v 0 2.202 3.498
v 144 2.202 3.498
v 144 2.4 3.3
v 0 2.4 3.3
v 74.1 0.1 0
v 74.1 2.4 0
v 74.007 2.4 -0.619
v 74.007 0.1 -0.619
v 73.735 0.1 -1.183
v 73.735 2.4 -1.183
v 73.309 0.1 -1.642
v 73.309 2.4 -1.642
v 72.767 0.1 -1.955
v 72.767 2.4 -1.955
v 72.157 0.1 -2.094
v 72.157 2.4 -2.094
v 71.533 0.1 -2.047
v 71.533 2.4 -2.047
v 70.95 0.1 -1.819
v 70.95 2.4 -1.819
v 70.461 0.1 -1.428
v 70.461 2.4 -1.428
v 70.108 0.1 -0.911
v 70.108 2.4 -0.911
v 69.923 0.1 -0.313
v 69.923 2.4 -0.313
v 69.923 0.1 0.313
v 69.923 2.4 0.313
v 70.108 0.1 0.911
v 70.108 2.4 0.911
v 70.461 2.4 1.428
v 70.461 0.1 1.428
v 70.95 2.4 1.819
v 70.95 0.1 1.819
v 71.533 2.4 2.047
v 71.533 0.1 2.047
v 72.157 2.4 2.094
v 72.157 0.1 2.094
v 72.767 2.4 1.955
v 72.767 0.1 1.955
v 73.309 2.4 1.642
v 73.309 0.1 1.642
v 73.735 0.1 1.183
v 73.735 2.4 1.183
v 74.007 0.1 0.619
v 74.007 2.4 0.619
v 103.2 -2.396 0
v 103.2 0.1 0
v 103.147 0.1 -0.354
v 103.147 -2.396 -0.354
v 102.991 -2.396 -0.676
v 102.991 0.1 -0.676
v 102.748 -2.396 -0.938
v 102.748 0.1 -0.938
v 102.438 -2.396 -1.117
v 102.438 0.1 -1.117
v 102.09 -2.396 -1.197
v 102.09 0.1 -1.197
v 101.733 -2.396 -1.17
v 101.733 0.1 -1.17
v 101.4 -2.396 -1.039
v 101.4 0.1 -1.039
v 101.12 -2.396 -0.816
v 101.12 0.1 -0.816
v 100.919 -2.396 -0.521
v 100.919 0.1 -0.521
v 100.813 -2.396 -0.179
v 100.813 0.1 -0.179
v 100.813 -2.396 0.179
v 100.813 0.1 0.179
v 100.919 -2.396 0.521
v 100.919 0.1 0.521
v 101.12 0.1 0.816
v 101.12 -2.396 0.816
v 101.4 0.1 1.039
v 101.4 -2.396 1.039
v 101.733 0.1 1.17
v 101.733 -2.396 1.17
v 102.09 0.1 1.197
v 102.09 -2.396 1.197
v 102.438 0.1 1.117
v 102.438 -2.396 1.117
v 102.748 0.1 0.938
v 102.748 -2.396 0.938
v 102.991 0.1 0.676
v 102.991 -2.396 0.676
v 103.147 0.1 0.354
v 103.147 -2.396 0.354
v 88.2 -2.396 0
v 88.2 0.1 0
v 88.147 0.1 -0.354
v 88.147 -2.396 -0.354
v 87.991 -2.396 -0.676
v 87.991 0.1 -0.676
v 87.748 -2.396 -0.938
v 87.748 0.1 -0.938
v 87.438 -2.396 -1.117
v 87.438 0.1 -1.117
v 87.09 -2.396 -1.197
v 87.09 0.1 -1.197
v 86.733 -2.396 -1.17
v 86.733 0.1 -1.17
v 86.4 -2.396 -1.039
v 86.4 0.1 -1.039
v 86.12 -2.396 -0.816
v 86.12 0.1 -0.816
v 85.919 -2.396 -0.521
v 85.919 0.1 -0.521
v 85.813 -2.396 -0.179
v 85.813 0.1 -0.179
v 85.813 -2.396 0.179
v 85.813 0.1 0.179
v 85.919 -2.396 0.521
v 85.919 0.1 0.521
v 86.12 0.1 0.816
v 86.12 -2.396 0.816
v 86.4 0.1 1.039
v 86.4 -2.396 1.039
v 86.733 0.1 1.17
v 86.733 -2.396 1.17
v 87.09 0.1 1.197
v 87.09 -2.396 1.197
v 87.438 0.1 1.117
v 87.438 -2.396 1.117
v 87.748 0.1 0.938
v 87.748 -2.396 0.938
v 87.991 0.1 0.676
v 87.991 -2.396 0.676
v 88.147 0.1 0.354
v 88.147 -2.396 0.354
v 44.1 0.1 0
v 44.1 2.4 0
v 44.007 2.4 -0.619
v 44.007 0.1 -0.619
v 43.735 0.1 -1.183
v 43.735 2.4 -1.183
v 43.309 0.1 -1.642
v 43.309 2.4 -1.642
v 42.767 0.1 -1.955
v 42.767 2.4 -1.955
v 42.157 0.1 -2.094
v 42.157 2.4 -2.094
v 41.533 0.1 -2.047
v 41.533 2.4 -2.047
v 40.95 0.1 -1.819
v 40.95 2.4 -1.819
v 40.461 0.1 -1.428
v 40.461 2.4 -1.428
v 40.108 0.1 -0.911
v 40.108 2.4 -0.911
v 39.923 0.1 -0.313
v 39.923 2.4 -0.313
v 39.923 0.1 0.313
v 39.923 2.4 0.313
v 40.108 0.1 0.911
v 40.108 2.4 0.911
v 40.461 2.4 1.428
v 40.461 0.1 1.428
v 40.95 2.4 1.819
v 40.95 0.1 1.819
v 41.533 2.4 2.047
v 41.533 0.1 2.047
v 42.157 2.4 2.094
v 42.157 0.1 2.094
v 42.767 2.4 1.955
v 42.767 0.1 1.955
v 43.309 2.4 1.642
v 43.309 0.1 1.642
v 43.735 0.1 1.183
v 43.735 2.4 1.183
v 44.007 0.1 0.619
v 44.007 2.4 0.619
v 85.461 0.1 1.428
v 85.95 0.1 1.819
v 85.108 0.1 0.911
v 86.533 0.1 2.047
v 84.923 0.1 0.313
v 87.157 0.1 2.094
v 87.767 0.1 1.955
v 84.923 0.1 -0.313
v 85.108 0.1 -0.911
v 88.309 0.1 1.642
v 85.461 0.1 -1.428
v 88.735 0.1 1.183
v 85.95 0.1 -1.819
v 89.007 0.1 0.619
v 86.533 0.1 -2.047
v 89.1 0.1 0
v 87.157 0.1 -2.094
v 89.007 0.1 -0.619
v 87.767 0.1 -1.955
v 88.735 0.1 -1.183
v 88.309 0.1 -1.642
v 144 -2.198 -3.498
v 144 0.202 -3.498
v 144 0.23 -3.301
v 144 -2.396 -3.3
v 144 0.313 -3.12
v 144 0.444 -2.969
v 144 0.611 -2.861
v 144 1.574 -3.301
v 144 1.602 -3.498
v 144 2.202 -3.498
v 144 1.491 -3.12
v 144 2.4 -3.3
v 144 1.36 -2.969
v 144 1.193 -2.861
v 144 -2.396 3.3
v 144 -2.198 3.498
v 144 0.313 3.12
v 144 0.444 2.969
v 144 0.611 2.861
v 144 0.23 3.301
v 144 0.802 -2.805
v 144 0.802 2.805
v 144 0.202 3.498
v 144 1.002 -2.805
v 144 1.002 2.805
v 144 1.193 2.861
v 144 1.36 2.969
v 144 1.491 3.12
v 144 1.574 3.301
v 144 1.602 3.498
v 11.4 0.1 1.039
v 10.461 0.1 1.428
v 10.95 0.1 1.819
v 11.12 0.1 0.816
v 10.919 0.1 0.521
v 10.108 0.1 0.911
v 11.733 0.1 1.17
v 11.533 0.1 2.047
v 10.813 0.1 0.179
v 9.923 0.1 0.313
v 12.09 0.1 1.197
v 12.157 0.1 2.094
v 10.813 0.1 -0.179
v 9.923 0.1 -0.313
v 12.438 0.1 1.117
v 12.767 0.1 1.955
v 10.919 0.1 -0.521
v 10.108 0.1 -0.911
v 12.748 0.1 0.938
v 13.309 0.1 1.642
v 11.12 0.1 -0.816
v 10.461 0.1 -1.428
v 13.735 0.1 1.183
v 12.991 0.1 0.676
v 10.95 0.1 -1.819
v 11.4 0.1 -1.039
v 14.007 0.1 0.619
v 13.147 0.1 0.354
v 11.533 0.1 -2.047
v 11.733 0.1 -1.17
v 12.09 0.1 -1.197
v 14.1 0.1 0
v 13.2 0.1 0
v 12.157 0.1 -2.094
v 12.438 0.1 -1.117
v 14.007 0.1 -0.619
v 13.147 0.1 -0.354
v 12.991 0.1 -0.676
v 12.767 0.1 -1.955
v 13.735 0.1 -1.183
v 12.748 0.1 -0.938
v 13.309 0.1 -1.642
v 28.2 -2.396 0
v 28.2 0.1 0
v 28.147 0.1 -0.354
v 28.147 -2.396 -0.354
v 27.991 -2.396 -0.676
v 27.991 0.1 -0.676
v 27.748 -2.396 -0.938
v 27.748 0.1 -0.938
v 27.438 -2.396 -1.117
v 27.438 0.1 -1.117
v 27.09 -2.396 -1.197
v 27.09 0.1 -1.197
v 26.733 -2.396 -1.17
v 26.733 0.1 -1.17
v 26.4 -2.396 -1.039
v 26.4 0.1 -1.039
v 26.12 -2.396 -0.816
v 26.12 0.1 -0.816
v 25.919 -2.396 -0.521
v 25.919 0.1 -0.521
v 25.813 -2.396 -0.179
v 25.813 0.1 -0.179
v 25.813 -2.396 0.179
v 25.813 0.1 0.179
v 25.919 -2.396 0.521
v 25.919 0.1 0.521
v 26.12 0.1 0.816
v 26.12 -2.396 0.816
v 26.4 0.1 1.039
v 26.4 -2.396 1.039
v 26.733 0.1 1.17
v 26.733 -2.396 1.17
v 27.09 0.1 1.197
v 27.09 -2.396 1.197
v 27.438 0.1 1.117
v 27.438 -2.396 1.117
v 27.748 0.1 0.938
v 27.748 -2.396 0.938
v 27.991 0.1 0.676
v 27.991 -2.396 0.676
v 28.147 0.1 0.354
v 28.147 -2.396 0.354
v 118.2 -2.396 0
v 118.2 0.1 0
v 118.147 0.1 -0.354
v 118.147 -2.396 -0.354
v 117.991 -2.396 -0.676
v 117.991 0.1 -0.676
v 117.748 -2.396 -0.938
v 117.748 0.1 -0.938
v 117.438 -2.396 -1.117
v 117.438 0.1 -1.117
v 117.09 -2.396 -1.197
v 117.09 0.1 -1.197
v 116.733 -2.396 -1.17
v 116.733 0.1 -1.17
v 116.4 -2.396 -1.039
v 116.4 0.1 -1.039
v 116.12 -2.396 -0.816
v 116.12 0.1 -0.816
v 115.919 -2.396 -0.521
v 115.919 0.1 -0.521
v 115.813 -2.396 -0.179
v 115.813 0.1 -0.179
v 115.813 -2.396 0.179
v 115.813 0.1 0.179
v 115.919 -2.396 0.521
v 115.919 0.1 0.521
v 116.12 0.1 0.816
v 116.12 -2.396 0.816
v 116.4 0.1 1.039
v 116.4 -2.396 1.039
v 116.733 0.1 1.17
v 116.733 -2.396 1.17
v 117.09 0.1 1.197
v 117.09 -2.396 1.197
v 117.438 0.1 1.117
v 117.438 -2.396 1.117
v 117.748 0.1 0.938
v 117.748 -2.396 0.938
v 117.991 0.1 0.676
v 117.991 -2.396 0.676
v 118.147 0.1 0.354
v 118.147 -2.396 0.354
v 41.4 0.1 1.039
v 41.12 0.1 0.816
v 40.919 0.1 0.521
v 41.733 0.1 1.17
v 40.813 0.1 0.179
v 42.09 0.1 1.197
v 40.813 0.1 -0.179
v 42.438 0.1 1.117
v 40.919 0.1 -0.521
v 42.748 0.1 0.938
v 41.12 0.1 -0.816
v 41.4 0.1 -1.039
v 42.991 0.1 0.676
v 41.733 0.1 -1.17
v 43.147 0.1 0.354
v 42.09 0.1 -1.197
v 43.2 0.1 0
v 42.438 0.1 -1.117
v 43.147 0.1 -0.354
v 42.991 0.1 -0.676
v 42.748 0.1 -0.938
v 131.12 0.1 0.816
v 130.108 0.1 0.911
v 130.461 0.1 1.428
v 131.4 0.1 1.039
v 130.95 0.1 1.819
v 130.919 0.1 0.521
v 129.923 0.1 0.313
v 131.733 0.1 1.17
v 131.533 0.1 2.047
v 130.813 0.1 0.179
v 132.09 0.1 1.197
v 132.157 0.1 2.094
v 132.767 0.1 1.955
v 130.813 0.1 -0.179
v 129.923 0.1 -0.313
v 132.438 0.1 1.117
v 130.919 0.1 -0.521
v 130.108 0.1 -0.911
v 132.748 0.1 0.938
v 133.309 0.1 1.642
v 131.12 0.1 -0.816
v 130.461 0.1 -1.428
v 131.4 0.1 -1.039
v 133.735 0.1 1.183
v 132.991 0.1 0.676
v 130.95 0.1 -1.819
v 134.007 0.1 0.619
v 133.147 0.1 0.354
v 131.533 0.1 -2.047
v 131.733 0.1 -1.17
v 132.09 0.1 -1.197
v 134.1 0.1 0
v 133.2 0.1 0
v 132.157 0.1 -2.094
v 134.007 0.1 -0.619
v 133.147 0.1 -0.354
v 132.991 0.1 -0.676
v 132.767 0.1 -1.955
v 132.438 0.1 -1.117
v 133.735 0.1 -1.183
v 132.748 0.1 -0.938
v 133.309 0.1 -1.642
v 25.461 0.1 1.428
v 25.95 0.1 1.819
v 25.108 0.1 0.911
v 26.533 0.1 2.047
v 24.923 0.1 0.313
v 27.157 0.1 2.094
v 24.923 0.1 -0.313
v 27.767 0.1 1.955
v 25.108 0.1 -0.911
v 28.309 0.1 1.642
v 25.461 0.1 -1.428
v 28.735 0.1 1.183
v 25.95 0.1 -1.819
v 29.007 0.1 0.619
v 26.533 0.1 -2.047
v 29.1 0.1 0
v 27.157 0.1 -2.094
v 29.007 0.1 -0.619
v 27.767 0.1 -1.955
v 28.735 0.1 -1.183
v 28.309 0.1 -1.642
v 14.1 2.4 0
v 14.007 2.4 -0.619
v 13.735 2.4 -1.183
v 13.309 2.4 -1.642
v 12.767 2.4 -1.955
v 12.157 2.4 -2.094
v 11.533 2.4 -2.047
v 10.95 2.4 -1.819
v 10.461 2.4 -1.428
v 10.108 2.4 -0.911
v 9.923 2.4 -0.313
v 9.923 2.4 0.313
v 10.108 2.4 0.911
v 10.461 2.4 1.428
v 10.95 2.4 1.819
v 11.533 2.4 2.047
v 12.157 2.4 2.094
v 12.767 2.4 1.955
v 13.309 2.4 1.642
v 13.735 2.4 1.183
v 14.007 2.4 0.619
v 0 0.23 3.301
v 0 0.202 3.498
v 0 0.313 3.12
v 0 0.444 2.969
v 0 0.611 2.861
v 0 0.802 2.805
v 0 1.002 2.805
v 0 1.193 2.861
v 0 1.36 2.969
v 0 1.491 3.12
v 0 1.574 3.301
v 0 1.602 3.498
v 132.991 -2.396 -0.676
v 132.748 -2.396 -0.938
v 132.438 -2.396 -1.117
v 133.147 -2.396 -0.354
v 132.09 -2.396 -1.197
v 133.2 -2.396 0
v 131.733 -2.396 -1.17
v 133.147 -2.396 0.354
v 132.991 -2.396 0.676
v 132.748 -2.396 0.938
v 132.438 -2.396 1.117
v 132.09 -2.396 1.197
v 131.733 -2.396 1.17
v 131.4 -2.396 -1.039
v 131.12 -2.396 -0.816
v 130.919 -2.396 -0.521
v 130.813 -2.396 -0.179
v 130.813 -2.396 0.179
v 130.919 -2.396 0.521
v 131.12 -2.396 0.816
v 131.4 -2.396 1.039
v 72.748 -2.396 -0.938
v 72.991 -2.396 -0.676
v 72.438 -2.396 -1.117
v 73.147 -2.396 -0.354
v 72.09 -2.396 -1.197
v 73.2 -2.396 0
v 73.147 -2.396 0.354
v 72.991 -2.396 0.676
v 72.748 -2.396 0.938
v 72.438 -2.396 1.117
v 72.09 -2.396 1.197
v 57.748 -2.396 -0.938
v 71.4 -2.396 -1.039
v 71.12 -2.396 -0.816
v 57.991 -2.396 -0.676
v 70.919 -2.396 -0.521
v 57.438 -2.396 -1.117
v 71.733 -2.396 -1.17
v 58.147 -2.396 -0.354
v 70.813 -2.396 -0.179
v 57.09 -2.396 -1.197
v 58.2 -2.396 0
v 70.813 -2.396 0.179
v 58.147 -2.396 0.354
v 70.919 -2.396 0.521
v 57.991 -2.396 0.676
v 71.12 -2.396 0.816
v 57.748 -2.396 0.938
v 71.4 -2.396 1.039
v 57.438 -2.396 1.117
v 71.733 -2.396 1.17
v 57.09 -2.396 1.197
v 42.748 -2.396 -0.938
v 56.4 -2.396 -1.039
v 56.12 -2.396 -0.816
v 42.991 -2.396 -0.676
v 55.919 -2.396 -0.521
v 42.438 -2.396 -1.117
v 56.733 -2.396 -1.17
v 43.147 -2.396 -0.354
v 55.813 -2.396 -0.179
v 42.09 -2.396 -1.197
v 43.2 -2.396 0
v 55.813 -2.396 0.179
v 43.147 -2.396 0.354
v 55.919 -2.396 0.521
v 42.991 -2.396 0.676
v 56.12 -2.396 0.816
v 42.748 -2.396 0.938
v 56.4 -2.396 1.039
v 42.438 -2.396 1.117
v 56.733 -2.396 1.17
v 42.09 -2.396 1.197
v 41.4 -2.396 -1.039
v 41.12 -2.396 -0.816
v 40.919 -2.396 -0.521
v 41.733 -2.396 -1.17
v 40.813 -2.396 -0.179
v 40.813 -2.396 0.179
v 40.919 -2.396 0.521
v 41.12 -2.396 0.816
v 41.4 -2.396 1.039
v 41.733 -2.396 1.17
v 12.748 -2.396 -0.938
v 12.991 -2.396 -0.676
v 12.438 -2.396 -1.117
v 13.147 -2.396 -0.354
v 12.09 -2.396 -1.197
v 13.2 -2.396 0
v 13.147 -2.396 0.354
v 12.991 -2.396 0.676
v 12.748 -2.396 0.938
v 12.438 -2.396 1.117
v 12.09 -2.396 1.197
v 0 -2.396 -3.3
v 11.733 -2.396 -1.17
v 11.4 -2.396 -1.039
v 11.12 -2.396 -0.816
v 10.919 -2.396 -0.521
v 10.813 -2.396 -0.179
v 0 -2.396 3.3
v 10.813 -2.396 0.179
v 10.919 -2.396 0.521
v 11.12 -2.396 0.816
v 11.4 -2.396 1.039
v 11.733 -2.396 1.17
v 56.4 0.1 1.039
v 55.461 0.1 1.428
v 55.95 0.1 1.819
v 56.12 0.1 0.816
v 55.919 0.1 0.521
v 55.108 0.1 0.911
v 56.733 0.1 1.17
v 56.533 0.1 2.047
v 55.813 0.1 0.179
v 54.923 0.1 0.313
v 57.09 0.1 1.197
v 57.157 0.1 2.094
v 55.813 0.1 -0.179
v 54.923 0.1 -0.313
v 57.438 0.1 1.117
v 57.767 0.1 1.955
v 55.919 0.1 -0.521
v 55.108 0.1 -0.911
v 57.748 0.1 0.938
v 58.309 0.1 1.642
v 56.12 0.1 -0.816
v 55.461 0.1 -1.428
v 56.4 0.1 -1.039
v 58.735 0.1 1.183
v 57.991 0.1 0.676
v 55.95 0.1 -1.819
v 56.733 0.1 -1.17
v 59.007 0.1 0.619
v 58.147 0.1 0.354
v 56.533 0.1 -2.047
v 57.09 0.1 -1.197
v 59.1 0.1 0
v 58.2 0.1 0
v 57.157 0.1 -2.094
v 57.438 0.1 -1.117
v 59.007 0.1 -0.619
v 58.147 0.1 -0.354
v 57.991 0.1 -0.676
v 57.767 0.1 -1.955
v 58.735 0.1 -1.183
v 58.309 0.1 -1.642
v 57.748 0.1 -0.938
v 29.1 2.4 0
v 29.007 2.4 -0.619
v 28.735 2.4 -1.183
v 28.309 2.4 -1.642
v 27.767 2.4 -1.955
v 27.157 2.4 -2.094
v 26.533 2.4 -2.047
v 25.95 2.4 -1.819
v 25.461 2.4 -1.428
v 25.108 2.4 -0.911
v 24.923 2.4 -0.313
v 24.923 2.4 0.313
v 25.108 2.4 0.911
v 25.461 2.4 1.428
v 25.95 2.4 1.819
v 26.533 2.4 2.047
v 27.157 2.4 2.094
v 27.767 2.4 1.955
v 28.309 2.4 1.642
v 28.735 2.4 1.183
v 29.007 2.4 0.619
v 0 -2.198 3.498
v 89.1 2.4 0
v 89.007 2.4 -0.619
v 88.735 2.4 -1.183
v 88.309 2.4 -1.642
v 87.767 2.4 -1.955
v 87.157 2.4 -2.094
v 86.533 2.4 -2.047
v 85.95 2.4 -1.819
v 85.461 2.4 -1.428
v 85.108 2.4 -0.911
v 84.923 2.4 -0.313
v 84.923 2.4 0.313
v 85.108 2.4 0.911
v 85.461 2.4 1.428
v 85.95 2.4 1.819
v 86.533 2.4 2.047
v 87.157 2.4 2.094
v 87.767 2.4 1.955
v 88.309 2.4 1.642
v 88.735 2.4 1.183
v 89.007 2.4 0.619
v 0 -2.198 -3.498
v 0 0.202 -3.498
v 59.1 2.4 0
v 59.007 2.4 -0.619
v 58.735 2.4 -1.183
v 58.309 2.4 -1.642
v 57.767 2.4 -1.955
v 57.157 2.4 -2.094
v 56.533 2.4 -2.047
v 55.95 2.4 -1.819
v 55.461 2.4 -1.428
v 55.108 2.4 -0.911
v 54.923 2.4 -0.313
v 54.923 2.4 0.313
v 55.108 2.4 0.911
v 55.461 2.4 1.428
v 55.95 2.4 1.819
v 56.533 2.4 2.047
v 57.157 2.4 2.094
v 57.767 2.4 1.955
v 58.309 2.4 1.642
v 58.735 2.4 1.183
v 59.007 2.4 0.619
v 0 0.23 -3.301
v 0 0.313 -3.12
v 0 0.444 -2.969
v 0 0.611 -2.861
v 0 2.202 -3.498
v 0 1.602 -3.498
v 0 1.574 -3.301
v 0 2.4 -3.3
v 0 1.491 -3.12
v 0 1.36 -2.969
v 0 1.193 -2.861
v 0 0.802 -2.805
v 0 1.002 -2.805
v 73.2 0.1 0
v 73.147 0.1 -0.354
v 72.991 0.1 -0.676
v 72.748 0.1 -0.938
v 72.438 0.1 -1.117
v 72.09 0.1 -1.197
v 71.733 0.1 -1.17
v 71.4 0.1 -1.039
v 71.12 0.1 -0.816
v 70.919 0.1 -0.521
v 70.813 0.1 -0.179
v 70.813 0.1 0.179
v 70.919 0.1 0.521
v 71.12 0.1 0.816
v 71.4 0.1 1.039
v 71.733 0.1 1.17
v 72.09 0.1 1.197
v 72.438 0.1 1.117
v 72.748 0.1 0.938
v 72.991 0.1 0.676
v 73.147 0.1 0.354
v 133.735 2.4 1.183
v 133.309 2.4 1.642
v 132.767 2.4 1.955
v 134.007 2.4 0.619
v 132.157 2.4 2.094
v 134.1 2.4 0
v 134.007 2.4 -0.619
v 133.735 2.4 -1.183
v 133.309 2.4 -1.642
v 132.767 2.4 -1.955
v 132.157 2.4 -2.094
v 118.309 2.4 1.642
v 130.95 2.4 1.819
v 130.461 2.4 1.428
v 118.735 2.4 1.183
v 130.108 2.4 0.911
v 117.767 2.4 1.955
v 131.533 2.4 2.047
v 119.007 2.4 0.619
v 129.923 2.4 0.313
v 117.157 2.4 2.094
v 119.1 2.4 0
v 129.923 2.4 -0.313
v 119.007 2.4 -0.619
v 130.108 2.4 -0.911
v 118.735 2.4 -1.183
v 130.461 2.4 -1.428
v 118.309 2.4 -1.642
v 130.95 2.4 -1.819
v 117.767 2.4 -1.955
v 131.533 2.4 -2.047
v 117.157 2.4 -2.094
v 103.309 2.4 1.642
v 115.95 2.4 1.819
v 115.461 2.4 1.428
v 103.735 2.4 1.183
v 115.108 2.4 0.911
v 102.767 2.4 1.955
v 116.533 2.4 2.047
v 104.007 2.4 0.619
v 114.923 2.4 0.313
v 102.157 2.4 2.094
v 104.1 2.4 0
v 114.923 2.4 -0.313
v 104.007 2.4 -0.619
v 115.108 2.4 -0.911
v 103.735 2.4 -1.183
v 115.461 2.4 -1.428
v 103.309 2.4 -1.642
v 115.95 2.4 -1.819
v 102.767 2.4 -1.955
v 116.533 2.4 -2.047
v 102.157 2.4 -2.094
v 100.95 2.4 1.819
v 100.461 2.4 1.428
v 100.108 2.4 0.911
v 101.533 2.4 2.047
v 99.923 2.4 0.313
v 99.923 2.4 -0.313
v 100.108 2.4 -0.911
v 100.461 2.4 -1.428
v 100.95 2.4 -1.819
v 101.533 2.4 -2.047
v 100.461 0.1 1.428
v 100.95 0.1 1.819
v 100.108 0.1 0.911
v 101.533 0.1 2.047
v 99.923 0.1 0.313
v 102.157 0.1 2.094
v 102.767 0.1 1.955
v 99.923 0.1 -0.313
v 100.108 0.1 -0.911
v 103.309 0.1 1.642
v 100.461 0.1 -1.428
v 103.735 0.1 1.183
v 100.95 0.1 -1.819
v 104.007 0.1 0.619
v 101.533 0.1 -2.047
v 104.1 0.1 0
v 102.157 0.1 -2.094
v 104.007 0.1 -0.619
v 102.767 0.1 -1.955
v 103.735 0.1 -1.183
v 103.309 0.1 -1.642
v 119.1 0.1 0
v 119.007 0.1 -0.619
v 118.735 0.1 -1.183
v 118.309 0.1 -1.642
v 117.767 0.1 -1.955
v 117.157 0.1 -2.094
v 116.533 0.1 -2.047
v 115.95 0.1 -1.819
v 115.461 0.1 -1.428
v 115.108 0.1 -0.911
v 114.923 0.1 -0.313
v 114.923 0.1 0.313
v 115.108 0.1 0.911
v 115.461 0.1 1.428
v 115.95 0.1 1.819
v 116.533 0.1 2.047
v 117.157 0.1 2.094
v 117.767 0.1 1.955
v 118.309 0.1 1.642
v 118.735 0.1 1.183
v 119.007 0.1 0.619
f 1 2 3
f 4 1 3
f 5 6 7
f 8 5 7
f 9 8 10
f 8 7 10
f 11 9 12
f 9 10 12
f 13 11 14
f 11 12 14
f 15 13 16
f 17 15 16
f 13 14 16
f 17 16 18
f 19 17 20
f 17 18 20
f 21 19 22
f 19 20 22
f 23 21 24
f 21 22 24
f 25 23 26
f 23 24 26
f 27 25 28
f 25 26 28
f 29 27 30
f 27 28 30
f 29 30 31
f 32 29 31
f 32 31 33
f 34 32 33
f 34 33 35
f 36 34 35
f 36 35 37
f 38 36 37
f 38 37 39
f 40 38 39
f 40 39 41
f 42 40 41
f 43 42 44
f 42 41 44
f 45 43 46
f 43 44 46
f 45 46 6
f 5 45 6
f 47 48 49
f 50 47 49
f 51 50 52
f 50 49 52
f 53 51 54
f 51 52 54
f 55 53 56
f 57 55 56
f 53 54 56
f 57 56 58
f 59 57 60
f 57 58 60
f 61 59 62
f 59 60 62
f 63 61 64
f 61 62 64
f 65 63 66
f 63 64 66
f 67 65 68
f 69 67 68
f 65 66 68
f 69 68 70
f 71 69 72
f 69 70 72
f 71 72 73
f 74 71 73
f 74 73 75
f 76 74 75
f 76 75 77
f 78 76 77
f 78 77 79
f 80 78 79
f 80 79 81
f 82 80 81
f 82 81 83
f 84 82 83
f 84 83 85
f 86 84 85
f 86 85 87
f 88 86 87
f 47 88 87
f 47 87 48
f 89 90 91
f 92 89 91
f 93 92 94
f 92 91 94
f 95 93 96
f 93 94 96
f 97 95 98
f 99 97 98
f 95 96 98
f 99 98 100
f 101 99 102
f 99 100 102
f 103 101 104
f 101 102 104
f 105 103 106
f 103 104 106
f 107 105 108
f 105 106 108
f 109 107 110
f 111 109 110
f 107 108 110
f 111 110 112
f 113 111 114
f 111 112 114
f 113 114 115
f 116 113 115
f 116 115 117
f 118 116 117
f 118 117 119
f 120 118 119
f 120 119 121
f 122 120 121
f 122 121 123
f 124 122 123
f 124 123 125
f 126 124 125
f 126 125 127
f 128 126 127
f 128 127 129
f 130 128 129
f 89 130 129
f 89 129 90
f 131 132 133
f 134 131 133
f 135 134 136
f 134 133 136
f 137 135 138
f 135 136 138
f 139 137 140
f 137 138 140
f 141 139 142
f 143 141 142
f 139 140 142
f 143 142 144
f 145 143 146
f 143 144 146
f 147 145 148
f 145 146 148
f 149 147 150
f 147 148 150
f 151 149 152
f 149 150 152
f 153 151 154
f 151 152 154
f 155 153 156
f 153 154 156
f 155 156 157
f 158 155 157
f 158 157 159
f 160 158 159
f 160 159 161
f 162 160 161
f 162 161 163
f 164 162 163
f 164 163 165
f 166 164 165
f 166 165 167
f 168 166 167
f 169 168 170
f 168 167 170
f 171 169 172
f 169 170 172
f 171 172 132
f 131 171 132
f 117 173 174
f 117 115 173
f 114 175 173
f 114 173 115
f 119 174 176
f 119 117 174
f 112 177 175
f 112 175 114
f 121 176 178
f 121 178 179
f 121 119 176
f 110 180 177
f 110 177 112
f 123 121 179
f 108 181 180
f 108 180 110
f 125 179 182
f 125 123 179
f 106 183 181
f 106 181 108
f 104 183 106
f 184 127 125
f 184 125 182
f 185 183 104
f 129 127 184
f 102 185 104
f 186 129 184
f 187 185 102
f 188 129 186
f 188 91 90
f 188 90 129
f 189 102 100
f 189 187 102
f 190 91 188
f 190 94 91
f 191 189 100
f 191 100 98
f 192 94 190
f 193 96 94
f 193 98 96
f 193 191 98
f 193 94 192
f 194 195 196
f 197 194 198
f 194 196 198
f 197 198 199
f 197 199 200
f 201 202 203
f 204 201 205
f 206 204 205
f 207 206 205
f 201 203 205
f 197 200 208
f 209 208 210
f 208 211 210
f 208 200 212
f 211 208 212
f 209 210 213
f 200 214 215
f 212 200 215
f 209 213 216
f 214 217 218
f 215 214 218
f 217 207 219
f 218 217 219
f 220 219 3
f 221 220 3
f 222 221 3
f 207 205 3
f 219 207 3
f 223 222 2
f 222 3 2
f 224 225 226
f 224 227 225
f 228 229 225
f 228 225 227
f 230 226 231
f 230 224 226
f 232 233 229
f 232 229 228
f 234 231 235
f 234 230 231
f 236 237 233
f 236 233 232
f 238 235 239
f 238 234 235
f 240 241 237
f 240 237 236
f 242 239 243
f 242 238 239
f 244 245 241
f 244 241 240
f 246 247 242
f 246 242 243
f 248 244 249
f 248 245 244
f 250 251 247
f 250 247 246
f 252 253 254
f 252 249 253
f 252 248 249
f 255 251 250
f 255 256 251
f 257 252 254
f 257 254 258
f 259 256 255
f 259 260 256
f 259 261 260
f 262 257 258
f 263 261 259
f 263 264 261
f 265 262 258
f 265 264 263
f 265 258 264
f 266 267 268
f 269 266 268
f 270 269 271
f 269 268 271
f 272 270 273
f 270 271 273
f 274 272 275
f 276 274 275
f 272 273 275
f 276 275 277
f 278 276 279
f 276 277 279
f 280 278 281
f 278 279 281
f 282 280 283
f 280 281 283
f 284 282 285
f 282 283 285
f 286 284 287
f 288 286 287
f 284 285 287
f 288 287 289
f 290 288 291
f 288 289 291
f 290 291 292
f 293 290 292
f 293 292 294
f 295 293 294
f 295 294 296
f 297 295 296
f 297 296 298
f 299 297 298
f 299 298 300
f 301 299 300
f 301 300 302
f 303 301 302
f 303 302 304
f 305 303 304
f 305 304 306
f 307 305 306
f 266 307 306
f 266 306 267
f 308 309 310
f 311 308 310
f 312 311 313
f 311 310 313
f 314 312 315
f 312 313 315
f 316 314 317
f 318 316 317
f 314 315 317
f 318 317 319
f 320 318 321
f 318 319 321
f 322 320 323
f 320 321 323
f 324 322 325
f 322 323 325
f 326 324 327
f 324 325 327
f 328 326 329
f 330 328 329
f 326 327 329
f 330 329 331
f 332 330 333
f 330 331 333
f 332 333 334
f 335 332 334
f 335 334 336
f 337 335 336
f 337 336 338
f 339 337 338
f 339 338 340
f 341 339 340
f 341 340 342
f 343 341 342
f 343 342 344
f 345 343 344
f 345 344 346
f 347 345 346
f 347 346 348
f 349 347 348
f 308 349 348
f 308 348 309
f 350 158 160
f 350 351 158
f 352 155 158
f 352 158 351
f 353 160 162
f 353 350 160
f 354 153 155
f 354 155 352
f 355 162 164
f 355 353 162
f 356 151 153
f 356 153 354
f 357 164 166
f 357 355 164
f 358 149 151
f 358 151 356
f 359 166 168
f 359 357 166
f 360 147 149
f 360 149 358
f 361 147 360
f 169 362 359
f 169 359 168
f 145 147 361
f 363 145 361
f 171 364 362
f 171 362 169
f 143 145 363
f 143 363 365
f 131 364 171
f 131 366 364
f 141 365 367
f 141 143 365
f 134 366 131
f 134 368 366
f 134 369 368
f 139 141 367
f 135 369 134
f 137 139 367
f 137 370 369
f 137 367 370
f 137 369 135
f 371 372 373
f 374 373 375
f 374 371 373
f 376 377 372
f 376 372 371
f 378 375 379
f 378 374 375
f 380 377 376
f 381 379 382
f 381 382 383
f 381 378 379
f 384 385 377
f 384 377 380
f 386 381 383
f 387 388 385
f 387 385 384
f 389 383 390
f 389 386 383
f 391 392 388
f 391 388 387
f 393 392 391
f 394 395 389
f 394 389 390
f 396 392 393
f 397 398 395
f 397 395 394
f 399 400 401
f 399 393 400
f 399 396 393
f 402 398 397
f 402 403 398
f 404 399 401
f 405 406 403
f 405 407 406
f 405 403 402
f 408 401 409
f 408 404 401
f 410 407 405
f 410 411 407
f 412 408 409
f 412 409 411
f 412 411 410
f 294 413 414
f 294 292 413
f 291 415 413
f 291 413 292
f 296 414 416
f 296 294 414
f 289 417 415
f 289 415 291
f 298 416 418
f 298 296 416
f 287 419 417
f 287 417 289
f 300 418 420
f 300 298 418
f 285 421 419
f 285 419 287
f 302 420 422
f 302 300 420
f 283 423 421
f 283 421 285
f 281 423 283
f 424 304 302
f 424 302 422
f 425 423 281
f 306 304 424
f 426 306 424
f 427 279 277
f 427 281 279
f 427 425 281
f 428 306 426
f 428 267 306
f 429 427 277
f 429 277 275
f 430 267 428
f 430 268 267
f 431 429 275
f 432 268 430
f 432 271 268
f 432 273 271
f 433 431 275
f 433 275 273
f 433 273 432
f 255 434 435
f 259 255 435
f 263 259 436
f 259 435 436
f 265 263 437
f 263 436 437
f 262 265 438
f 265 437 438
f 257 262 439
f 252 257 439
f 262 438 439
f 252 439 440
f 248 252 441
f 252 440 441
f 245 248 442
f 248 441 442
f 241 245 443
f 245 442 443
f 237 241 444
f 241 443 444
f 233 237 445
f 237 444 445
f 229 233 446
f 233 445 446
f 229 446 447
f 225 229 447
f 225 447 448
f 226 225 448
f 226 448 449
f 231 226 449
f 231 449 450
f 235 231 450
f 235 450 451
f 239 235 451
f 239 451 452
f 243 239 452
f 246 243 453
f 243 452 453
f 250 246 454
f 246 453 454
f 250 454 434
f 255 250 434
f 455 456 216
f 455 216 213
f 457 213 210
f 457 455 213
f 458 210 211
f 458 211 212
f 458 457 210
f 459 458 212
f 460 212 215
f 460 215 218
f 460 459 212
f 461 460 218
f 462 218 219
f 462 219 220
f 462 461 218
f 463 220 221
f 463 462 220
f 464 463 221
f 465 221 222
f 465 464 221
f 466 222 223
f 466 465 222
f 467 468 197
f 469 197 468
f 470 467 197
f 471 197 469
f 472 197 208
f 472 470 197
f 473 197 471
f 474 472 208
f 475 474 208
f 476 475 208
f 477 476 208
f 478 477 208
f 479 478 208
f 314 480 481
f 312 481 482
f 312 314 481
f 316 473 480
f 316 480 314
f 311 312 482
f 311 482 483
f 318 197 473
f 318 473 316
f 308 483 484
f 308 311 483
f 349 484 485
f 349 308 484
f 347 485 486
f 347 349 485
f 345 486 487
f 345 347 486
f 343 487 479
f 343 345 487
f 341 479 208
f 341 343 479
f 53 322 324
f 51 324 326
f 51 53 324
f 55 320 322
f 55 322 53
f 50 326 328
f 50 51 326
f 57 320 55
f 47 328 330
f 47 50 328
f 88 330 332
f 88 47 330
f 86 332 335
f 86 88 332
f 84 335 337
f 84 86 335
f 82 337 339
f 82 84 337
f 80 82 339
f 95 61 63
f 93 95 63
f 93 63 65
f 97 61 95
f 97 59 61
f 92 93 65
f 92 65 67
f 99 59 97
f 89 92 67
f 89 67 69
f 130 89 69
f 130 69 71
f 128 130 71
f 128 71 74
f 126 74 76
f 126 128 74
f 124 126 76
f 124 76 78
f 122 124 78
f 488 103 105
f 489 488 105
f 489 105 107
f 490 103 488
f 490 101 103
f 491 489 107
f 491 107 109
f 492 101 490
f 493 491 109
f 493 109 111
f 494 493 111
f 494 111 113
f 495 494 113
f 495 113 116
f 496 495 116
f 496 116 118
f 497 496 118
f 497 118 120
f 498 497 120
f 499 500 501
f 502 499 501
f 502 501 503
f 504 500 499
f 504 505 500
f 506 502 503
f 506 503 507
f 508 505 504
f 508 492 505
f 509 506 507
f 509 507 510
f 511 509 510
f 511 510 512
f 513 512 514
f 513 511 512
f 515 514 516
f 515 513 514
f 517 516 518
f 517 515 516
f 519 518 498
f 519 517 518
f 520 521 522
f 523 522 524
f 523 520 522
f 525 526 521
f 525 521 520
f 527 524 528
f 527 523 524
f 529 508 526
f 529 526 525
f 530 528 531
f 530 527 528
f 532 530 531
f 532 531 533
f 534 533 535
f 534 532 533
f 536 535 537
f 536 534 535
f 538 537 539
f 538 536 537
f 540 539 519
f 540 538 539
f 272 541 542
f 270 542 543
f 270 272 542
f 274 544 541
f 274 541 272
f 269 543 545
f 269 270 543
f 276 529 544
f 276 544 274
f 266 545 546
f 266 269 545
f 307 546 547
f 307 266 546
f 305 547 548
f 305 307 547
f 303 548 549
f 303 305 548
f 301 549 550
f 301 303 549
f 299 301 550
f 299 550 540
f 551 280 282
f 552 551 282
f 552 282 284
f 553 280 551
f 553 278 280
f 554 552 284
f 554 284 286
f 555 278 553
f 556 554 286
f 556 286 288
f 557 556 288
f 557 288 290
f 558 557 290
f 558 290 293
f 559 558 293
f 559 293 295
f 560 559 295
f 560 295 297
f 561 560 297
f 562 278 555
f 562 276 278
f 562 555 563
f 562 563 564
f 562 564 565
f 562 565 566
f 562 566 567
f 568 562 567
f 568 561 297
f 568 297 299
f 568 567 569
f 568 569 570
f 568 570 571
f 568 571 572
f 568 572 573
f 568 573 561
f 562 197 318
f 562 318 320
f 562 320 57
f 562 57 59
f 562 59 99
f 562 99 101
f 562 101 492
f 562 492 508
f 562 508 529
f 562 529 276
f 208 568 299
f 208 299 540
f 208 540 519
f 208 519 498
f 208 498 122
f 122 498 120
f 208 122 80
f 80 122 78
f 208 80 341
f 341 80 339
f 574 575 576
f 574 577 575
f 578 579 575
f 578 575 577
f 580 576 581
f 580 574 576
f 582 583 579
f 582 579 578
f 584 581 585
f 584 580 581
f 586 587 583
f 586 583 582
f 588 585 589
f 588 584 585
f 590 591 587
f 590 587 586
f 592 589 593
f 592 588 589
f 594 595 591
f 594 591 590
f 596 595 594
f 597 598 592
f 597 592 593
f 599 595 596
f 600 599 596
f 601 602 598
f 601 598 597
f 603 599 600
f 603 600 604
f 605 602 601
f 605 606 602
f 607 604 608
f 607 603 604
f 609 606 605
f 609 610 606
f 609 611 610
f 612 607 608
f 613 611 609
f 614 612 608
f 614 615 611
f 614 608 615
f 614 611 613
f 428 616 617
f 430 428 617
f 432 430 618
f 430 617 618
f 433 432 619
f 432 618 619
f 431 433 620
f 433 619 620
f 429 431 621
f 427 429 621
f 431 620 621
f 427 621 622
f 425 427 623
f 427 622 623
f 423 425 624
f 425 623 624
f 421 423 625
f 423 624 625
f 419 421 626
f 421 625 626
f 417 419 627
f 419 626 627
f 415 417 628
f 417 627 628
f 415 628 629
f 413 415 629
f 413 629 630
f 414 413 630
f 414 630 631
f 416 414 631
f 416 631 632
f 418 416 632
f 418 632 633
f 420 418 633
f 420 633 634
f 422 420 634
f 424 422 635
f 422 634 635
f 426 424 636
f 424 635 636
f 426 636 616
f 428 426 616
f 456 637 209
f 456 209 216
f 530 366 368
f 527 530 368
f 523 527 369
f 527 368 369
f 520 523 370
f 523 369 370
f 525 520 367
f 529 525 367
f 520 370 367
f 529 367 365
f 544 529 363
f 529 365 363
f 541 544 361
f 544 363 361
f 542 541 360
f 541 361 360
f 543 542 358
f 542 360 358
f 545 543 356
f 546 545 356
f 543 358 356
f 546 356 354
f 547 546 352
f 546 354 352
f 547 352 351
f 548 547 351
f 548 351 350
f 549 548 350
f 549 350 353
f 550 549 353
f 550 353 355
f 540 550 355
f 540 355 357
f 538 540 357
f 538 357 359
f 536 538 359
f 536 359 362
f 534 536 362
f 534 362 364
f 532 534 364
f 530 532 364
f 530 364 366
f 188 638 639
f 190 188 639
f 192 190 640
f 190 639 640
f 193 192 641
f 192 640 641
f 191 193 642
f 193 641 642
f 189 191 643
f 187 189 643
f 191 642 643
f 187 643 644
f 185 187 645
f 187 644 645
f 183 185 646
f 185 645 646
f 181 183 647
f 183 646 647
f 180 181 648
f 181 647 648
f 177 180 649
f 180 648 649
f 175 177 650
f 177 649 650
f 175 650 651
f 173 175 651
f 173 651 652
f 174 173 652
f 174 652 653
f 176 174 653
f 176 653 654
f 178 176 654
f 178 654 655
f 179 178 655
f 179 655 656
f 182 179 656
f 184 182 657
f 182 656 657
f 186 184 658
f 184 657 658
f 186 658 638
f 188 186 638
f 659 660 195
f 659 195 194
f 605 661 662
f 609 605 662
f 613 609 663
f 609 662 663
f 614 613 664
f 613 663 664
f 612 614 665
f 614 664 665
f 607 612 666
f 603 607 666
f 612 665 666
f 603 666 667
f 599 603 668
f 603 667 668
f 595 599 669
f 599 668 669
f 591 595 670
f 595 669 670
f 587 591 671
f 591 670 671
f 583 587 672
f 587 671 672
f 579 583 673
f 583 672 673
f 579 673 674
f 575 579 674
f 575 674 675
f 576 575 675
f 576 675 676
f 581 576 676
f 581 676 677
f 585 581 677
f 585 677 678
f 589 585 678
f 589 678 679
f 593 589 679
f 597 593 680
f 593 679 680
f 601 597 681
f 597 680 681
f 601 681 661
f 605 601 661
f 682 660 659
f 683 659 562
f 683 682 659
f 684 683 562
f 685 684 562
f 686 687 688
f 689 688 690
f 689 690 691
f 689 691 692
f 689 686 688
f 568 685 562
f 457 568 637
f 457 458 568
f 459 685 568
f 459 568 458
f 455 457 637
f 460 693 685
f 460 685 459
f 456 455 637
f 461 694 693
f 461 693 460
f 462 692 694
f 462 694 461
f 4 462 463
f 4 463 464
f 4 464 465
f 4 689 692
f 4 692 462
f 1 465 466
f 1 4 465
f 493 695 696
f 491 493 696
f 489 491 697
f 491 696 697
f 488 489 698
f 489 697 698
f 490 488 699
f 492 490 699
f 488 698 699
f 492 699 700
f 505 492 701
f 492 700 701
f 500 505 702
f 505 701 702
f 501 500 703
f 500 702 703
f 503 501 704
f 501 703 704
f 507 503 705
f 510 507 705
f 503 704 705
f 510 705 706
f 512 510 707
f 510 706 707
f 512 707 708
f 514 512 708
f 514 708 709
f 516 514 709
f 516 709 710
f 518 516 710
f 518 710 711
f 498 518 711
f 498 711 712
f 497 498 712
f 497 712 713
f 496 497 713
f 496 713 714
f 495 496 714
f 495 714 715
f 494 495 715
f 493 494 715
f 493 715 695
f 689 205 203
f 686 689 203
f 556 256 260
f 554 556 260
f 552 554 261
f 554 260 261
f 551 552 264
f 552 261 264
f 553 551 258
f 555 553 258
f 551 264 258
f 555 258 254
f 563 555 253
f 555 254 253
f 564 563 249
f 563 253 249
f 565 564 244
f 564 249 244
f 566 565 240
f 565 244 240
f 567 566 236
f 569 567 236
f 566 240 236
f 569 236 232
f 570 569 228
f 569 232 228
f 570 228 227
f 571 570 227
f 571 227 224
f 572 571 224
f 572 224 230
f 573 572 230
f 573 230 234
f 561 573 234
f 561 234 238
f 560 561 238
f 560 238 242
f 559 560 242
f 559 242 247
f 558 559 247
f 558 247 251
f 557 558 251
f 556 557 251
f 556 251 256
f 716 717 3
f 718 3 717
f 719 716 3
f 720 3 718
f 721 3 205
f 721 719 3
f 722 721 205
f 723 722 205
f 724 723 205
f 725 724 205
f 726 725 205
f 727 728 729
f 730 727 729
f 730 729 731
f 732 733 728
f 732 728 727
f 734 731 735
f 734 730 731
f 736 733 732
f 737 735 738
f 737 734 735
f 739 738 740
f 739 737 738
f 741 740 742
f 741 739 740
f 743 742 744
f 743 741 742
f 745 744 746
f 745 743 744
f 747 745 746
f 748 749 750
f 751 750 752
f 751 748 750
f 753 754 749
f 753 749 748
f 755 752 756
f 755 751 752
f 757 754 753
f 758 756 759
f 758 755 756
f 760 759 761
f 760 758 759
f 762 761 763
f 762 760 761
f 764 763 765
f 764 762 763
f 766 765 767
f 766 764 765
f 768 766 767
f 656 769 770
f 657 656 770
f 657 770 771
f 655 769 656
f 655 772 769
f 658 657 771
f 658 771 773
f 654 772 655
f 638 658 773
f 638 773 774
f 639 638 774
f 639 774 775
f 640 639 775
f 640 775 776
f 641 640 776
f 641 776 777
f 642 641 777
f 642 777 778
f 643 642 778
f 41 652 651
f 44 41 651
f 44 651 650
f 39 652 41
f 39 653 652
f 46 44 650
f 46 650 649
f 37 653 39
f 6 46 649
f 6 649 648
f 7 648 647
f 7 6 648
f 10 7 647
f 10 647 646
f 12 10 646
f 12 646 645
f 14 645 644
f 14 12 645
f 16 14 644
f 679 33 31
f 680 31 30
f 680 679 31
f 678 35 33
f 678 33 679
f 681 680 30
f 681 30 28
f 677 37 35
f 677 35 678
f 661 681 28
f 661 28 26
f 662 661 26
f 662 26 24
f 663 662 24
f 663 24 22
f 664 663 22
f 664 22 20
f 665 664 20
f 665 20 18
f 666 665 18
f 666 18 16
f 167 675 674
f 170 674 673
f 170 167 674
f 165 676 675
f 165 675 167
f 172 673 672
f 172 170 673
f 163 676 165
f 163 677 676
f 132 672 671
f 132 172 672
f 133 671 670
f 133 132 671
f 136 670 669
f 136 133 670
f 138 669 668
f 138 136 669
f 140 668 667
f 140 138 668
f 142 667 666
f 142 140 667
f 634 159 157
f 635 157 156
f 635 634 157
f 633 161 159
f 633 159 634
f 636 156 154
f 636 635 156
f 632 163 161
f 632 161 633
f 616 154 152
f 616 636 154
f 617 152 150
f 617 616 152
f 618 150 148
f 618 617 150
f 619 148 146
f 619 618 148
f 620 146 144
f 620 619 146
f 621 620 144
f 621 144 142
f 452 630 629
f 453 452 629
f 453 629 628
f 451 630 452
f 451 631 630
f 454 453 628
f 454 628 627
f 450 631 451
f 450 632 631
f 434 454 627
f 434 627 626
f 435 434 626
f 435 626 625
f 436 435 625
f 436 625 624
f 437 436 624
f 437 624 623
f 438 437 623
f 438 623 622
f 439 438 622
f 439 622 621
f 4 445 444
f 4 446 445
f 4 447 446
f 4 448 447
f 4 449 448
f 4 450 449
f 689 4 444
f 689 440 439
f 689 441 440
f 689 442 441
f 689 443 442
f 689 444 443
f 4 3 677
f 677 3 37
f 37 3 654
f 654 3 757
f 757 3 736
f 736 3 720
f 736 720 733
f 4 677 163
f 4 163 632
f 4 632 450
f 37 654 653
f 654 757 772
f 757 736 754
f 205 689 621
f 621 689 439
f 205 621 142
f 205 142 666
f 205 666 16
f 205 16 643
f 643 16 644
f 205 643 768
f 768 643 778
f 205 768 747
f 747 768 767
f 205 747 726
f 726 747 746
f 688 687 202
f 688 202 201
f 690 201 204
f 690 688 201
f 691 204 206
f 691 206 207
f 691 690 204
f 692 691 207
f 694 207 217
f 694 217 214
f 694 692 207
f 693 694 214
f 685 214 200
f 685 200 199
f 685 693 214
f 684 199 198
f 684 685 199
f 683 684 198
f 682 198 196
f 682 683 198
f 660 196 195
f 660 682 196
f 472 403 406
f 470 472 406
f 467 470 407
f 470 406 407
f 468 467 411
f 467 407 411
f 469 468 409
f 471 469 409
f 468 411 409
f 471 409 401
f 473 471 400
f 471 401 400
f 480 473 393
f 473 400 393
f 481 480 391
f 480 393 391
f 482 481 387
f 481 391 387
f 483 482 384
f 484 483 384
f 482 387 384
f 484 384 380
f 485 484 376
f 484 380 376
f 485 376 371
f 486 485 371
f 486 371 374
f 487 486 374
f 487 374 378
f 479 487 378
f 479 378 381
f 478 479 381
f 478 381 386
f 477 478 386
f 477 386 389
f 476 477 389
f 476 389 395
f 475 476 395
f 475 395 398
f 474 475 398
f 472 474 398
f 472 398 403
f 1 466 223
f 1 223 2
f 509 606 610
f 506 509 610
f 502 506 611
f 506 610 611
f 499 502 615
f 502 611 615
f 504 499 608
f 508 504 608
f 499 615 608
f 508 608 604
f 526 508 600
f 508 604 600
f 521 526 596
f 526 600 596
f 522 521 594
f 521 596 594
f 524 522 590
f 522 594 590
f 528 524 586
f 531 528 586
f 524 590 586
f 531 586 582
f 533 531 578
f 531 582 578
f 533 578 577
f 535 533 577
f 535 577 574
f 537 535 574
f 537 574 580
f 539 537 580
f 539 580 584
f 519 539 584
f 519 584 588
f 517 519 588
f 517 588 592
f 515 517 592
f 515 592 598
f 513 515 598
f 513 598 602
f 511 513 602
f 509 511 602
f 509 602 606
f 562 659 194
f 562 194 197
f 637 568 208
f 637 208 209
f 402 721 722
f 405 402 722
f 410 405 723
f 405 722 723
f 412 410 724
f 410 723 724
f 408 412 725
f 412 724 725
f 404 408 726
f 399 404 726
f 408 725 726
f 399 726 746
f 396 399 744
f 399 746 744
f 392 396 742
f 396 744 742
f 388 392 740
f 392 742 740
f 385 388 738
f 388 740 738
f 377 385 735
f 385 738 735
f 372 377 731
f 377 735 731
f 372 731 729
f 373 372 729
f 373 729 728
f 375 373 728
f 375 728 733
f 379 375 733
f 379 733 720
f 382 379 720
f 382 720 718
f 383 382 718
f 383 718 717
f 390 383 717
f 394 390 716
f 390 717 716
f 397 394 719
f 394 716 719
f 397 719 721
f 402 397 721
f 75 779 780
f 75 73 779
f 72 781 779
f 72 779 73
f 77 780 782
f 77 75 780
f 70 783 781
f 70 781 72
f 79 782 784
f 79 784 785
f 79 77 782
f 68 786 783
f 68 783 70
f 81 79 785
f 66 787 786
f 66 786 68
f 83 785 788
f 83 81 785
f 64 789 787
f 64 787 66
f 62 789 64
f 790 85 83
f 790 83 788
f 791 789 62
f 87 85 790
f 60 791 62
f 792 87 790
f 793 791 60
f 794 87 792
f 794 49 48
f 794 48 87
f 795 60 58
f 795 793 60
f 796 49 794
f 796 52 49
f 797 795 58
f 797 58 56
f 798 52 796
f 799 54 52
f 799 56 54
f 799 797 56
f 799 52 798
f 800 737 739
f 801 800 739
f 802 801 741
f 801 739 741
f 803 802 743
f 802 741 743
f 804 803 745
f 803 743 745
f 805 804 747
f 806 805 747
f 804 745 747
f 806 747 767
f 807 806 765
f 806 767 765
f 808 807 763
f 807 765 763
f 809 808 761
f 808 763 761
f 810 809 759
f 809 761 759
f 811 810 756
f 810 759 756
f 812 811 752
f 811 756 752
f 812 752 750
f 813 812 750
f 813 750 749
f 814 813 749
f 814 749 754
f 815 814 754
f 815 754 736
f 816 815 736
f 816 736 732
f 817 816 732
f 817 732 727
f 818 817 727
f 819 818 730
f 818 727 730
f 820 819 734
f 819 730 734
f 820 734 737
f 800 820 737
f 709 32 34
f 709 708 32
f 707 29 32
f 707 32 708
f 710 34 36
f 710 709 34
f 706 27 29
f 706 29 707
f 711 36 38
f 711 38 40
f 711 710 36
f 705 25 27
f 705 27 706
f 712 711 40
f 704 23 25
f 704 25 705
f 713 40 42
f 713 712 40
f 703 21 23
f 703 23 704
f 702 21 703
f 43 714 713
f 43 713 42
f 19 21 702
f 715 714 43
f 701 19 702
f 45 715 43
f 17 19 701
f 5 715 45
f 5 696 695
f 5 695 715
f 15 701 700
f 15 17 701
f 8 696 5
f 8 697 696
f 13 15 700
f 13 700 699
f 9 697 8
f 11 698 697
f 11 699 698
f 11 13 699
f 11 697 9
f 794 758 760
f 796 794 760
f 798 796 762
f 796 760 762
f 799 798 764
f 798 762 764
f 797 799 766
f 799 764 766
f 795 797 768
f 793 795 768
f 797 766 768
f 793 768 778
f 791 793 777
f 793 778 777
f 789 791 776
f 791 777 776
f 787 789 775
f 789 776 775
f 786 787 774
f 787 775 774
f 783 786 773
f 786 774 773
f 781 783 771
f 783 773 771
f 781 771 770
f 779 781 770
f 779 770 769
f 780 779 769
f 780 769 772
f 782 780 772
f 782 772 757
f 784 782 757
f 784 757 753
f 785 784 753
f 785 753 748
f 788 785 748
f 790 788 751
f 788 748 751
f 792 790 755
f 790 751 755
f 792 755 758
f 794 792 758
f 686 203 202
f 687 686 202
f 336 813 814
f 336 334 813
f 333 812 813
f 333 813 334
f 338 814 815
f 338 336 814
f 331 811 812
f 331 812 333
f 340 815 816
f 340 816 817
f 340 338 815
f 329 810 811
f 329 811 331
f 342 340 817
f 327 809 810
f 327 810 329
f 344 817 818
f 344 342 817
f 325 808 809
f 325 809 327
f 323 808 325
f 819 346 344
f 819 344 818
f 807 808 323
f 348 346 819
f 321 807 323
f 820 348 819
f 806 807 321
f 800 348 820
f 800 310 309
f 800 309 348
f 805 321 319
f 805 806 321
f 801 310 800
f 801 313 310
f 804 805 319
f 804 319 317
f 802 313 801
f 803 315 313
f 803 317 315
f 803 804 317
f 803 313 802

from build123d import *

# Parameters (mm, degrees)
EXTRUDE_1_DEPTH          = 144
SKETCH_2_R               = 2.1
CUT_EXTRUDE_1_DEPTH      = 2.3
SKETCH_3_R               = 1.2
CUT_EXTRUDE_2_DEPTH      = 1
CUT_EXTRUDE_2_DEPTH_BACK = 5.795979797


with BuildPart() as part:
    # 草图1 → 凸台-拉伸1 (new body)
    with BuildSketch(Plane(origin=(0, 0, 0), x_dir=(0, 0, -1), z_dir=(1, 0, 0))):
        with BuildLine():
            Line((3.497989899, 0.202010101), (3.497989899, -2.197989899))
            Line((3.497989899, -2.197989899), (3.3, -2.395979797))
            Line((3.3, -2.395979797), (-3.3, -2.395979797))
            Line((-3.3, -2.395979797), (-3.497989899, -2.197989899))
            Line((-3.497989899, -2.197989899), (-3.497989899, 0.202010101))
            ThreePointArc((-3.497989899, 0.202010101), (-2.797989899, 0.902010101), (-3.497989899, 1.602010101))
            Line((-3.497989899, 1.602010101), (-3.497989899, 2.202010101))
            Line((-3.497989899, 2.202010101), (-3.3, 2.4))
            Line((-3.3, 2.4), (3.3, 2.4))
            Line((3.3, 2.4), (3.497989899, 2.202010101))
            Line((3.497989899, 2.202010101), (3.497989899, 1.602010101))
            ThreePointArc((3.497989899, 1.602010101), (2.797989899, 0.902010101), (3.497989899, 0.202010101))
        make_face()
    extrude(amount=EXTRUDE_1_DEPTH)

    # 草图2 → 切除-拉伸1 (cut)
    with BuildSketch(Plane(origin=(0, 2.4, 0), x_dir=(1, 0, 0), z_dir=(0, 1, 0))):
        with Locations((12, 0)):
            Circle(SKETCH_2_R)
        with Locations((27, 0)):
            Circle(SKETCH_2_R)
        with Locations((42, 0)):
            Circle(SKETCH_2_R)
        with Locations((57, 0)):
            Circle(SKETCH_2_R)
        with Locations((72, 0)):
            Circle(SKETCH_2_R)
        with Locations((87, 0)):
            Circle(SKETCH_2_R)
        with Locations((102, 0)):
            Circle(SKETCH_2_R)
        with Locations((117, 0)):
            Circle(SKETCH_2_R)
        with Locations((132, 0)):
            Circle(SKETCH_2_R)
        with Locations((147, 0)):
            Circle(SKETCH_2_R)
        with Locations((162, 0)):
            Circle(SKETCH_2_R)
        with Locations((177, 0)):
            Circle(SKETCH_2_R)
        with Locations((192, 0)):
            Circle(SKETCH_2_R)
        with Locations((207, 0)):
            Circle(SKETCH_2_R)
        with Locations((222, 0)):
            Circle(SKETCH_2_R)
    extrude(amount=-CUT_EXTRUDE_1_DEPTH, mode=Mode.SUBTRACT)

    # 草图3 → 切除-拉伸2 (cut, two sides)
    with BuildSketch(Plane(origin=(0, 2.4, 0), x_dir=(1, 0, 0), z_dir=(0, 1, 0))) as cut_extrude_2_sk:
        with Locations((12, 0)):
            Circle(SKETCH_3_R)
        with Locations((27, 0)):
            Circle(SKETCH_3_R)
        with Locations((42, 0)):
            Circle(SKETCH_3_R)
        with Locations((57, 0)):
            Circle(SKETCH_3_R)
        with Locations((72, 0)):
            Circle(SKETCH_3_R)
        with Locations((87, 0)):
            Circle(SKETCH_3_R)
        with Locations((102, 0)):
            Circle(SKETCH_3_R)
        with Locations((117, 0)):
            Circle(SKETCH_3_R)
        with Locations((132, 0)):
            Circle(SKETCH_3_R)
        with Locations((147, 0)):
            Circle(SKETCH_3_R)
        with Locations((162, 0)):
            Circle(SKETCH_3_R)
        with Locations((177, 0)):
            Circle(SKETCH_3_R)
        with Locations((192, 0)):
            Circle(SKETCH_3_R)
        with Locations((207, 0)):
            Circle(SKETCH_3_R)
        with Locations((222, 0)):
            Circle(SKETCH_3_R)
    extrude(amount=CUT_EXTRUDE_2_DEPTH, mode=Mode.SUBTRACT)
    extrude(cut_extrude_2_sk.sketch, amount=-CUT_EXTRUDE_2_DEPTH_BACK, mode=Mode.SUBTRACT)


solid = part.part
